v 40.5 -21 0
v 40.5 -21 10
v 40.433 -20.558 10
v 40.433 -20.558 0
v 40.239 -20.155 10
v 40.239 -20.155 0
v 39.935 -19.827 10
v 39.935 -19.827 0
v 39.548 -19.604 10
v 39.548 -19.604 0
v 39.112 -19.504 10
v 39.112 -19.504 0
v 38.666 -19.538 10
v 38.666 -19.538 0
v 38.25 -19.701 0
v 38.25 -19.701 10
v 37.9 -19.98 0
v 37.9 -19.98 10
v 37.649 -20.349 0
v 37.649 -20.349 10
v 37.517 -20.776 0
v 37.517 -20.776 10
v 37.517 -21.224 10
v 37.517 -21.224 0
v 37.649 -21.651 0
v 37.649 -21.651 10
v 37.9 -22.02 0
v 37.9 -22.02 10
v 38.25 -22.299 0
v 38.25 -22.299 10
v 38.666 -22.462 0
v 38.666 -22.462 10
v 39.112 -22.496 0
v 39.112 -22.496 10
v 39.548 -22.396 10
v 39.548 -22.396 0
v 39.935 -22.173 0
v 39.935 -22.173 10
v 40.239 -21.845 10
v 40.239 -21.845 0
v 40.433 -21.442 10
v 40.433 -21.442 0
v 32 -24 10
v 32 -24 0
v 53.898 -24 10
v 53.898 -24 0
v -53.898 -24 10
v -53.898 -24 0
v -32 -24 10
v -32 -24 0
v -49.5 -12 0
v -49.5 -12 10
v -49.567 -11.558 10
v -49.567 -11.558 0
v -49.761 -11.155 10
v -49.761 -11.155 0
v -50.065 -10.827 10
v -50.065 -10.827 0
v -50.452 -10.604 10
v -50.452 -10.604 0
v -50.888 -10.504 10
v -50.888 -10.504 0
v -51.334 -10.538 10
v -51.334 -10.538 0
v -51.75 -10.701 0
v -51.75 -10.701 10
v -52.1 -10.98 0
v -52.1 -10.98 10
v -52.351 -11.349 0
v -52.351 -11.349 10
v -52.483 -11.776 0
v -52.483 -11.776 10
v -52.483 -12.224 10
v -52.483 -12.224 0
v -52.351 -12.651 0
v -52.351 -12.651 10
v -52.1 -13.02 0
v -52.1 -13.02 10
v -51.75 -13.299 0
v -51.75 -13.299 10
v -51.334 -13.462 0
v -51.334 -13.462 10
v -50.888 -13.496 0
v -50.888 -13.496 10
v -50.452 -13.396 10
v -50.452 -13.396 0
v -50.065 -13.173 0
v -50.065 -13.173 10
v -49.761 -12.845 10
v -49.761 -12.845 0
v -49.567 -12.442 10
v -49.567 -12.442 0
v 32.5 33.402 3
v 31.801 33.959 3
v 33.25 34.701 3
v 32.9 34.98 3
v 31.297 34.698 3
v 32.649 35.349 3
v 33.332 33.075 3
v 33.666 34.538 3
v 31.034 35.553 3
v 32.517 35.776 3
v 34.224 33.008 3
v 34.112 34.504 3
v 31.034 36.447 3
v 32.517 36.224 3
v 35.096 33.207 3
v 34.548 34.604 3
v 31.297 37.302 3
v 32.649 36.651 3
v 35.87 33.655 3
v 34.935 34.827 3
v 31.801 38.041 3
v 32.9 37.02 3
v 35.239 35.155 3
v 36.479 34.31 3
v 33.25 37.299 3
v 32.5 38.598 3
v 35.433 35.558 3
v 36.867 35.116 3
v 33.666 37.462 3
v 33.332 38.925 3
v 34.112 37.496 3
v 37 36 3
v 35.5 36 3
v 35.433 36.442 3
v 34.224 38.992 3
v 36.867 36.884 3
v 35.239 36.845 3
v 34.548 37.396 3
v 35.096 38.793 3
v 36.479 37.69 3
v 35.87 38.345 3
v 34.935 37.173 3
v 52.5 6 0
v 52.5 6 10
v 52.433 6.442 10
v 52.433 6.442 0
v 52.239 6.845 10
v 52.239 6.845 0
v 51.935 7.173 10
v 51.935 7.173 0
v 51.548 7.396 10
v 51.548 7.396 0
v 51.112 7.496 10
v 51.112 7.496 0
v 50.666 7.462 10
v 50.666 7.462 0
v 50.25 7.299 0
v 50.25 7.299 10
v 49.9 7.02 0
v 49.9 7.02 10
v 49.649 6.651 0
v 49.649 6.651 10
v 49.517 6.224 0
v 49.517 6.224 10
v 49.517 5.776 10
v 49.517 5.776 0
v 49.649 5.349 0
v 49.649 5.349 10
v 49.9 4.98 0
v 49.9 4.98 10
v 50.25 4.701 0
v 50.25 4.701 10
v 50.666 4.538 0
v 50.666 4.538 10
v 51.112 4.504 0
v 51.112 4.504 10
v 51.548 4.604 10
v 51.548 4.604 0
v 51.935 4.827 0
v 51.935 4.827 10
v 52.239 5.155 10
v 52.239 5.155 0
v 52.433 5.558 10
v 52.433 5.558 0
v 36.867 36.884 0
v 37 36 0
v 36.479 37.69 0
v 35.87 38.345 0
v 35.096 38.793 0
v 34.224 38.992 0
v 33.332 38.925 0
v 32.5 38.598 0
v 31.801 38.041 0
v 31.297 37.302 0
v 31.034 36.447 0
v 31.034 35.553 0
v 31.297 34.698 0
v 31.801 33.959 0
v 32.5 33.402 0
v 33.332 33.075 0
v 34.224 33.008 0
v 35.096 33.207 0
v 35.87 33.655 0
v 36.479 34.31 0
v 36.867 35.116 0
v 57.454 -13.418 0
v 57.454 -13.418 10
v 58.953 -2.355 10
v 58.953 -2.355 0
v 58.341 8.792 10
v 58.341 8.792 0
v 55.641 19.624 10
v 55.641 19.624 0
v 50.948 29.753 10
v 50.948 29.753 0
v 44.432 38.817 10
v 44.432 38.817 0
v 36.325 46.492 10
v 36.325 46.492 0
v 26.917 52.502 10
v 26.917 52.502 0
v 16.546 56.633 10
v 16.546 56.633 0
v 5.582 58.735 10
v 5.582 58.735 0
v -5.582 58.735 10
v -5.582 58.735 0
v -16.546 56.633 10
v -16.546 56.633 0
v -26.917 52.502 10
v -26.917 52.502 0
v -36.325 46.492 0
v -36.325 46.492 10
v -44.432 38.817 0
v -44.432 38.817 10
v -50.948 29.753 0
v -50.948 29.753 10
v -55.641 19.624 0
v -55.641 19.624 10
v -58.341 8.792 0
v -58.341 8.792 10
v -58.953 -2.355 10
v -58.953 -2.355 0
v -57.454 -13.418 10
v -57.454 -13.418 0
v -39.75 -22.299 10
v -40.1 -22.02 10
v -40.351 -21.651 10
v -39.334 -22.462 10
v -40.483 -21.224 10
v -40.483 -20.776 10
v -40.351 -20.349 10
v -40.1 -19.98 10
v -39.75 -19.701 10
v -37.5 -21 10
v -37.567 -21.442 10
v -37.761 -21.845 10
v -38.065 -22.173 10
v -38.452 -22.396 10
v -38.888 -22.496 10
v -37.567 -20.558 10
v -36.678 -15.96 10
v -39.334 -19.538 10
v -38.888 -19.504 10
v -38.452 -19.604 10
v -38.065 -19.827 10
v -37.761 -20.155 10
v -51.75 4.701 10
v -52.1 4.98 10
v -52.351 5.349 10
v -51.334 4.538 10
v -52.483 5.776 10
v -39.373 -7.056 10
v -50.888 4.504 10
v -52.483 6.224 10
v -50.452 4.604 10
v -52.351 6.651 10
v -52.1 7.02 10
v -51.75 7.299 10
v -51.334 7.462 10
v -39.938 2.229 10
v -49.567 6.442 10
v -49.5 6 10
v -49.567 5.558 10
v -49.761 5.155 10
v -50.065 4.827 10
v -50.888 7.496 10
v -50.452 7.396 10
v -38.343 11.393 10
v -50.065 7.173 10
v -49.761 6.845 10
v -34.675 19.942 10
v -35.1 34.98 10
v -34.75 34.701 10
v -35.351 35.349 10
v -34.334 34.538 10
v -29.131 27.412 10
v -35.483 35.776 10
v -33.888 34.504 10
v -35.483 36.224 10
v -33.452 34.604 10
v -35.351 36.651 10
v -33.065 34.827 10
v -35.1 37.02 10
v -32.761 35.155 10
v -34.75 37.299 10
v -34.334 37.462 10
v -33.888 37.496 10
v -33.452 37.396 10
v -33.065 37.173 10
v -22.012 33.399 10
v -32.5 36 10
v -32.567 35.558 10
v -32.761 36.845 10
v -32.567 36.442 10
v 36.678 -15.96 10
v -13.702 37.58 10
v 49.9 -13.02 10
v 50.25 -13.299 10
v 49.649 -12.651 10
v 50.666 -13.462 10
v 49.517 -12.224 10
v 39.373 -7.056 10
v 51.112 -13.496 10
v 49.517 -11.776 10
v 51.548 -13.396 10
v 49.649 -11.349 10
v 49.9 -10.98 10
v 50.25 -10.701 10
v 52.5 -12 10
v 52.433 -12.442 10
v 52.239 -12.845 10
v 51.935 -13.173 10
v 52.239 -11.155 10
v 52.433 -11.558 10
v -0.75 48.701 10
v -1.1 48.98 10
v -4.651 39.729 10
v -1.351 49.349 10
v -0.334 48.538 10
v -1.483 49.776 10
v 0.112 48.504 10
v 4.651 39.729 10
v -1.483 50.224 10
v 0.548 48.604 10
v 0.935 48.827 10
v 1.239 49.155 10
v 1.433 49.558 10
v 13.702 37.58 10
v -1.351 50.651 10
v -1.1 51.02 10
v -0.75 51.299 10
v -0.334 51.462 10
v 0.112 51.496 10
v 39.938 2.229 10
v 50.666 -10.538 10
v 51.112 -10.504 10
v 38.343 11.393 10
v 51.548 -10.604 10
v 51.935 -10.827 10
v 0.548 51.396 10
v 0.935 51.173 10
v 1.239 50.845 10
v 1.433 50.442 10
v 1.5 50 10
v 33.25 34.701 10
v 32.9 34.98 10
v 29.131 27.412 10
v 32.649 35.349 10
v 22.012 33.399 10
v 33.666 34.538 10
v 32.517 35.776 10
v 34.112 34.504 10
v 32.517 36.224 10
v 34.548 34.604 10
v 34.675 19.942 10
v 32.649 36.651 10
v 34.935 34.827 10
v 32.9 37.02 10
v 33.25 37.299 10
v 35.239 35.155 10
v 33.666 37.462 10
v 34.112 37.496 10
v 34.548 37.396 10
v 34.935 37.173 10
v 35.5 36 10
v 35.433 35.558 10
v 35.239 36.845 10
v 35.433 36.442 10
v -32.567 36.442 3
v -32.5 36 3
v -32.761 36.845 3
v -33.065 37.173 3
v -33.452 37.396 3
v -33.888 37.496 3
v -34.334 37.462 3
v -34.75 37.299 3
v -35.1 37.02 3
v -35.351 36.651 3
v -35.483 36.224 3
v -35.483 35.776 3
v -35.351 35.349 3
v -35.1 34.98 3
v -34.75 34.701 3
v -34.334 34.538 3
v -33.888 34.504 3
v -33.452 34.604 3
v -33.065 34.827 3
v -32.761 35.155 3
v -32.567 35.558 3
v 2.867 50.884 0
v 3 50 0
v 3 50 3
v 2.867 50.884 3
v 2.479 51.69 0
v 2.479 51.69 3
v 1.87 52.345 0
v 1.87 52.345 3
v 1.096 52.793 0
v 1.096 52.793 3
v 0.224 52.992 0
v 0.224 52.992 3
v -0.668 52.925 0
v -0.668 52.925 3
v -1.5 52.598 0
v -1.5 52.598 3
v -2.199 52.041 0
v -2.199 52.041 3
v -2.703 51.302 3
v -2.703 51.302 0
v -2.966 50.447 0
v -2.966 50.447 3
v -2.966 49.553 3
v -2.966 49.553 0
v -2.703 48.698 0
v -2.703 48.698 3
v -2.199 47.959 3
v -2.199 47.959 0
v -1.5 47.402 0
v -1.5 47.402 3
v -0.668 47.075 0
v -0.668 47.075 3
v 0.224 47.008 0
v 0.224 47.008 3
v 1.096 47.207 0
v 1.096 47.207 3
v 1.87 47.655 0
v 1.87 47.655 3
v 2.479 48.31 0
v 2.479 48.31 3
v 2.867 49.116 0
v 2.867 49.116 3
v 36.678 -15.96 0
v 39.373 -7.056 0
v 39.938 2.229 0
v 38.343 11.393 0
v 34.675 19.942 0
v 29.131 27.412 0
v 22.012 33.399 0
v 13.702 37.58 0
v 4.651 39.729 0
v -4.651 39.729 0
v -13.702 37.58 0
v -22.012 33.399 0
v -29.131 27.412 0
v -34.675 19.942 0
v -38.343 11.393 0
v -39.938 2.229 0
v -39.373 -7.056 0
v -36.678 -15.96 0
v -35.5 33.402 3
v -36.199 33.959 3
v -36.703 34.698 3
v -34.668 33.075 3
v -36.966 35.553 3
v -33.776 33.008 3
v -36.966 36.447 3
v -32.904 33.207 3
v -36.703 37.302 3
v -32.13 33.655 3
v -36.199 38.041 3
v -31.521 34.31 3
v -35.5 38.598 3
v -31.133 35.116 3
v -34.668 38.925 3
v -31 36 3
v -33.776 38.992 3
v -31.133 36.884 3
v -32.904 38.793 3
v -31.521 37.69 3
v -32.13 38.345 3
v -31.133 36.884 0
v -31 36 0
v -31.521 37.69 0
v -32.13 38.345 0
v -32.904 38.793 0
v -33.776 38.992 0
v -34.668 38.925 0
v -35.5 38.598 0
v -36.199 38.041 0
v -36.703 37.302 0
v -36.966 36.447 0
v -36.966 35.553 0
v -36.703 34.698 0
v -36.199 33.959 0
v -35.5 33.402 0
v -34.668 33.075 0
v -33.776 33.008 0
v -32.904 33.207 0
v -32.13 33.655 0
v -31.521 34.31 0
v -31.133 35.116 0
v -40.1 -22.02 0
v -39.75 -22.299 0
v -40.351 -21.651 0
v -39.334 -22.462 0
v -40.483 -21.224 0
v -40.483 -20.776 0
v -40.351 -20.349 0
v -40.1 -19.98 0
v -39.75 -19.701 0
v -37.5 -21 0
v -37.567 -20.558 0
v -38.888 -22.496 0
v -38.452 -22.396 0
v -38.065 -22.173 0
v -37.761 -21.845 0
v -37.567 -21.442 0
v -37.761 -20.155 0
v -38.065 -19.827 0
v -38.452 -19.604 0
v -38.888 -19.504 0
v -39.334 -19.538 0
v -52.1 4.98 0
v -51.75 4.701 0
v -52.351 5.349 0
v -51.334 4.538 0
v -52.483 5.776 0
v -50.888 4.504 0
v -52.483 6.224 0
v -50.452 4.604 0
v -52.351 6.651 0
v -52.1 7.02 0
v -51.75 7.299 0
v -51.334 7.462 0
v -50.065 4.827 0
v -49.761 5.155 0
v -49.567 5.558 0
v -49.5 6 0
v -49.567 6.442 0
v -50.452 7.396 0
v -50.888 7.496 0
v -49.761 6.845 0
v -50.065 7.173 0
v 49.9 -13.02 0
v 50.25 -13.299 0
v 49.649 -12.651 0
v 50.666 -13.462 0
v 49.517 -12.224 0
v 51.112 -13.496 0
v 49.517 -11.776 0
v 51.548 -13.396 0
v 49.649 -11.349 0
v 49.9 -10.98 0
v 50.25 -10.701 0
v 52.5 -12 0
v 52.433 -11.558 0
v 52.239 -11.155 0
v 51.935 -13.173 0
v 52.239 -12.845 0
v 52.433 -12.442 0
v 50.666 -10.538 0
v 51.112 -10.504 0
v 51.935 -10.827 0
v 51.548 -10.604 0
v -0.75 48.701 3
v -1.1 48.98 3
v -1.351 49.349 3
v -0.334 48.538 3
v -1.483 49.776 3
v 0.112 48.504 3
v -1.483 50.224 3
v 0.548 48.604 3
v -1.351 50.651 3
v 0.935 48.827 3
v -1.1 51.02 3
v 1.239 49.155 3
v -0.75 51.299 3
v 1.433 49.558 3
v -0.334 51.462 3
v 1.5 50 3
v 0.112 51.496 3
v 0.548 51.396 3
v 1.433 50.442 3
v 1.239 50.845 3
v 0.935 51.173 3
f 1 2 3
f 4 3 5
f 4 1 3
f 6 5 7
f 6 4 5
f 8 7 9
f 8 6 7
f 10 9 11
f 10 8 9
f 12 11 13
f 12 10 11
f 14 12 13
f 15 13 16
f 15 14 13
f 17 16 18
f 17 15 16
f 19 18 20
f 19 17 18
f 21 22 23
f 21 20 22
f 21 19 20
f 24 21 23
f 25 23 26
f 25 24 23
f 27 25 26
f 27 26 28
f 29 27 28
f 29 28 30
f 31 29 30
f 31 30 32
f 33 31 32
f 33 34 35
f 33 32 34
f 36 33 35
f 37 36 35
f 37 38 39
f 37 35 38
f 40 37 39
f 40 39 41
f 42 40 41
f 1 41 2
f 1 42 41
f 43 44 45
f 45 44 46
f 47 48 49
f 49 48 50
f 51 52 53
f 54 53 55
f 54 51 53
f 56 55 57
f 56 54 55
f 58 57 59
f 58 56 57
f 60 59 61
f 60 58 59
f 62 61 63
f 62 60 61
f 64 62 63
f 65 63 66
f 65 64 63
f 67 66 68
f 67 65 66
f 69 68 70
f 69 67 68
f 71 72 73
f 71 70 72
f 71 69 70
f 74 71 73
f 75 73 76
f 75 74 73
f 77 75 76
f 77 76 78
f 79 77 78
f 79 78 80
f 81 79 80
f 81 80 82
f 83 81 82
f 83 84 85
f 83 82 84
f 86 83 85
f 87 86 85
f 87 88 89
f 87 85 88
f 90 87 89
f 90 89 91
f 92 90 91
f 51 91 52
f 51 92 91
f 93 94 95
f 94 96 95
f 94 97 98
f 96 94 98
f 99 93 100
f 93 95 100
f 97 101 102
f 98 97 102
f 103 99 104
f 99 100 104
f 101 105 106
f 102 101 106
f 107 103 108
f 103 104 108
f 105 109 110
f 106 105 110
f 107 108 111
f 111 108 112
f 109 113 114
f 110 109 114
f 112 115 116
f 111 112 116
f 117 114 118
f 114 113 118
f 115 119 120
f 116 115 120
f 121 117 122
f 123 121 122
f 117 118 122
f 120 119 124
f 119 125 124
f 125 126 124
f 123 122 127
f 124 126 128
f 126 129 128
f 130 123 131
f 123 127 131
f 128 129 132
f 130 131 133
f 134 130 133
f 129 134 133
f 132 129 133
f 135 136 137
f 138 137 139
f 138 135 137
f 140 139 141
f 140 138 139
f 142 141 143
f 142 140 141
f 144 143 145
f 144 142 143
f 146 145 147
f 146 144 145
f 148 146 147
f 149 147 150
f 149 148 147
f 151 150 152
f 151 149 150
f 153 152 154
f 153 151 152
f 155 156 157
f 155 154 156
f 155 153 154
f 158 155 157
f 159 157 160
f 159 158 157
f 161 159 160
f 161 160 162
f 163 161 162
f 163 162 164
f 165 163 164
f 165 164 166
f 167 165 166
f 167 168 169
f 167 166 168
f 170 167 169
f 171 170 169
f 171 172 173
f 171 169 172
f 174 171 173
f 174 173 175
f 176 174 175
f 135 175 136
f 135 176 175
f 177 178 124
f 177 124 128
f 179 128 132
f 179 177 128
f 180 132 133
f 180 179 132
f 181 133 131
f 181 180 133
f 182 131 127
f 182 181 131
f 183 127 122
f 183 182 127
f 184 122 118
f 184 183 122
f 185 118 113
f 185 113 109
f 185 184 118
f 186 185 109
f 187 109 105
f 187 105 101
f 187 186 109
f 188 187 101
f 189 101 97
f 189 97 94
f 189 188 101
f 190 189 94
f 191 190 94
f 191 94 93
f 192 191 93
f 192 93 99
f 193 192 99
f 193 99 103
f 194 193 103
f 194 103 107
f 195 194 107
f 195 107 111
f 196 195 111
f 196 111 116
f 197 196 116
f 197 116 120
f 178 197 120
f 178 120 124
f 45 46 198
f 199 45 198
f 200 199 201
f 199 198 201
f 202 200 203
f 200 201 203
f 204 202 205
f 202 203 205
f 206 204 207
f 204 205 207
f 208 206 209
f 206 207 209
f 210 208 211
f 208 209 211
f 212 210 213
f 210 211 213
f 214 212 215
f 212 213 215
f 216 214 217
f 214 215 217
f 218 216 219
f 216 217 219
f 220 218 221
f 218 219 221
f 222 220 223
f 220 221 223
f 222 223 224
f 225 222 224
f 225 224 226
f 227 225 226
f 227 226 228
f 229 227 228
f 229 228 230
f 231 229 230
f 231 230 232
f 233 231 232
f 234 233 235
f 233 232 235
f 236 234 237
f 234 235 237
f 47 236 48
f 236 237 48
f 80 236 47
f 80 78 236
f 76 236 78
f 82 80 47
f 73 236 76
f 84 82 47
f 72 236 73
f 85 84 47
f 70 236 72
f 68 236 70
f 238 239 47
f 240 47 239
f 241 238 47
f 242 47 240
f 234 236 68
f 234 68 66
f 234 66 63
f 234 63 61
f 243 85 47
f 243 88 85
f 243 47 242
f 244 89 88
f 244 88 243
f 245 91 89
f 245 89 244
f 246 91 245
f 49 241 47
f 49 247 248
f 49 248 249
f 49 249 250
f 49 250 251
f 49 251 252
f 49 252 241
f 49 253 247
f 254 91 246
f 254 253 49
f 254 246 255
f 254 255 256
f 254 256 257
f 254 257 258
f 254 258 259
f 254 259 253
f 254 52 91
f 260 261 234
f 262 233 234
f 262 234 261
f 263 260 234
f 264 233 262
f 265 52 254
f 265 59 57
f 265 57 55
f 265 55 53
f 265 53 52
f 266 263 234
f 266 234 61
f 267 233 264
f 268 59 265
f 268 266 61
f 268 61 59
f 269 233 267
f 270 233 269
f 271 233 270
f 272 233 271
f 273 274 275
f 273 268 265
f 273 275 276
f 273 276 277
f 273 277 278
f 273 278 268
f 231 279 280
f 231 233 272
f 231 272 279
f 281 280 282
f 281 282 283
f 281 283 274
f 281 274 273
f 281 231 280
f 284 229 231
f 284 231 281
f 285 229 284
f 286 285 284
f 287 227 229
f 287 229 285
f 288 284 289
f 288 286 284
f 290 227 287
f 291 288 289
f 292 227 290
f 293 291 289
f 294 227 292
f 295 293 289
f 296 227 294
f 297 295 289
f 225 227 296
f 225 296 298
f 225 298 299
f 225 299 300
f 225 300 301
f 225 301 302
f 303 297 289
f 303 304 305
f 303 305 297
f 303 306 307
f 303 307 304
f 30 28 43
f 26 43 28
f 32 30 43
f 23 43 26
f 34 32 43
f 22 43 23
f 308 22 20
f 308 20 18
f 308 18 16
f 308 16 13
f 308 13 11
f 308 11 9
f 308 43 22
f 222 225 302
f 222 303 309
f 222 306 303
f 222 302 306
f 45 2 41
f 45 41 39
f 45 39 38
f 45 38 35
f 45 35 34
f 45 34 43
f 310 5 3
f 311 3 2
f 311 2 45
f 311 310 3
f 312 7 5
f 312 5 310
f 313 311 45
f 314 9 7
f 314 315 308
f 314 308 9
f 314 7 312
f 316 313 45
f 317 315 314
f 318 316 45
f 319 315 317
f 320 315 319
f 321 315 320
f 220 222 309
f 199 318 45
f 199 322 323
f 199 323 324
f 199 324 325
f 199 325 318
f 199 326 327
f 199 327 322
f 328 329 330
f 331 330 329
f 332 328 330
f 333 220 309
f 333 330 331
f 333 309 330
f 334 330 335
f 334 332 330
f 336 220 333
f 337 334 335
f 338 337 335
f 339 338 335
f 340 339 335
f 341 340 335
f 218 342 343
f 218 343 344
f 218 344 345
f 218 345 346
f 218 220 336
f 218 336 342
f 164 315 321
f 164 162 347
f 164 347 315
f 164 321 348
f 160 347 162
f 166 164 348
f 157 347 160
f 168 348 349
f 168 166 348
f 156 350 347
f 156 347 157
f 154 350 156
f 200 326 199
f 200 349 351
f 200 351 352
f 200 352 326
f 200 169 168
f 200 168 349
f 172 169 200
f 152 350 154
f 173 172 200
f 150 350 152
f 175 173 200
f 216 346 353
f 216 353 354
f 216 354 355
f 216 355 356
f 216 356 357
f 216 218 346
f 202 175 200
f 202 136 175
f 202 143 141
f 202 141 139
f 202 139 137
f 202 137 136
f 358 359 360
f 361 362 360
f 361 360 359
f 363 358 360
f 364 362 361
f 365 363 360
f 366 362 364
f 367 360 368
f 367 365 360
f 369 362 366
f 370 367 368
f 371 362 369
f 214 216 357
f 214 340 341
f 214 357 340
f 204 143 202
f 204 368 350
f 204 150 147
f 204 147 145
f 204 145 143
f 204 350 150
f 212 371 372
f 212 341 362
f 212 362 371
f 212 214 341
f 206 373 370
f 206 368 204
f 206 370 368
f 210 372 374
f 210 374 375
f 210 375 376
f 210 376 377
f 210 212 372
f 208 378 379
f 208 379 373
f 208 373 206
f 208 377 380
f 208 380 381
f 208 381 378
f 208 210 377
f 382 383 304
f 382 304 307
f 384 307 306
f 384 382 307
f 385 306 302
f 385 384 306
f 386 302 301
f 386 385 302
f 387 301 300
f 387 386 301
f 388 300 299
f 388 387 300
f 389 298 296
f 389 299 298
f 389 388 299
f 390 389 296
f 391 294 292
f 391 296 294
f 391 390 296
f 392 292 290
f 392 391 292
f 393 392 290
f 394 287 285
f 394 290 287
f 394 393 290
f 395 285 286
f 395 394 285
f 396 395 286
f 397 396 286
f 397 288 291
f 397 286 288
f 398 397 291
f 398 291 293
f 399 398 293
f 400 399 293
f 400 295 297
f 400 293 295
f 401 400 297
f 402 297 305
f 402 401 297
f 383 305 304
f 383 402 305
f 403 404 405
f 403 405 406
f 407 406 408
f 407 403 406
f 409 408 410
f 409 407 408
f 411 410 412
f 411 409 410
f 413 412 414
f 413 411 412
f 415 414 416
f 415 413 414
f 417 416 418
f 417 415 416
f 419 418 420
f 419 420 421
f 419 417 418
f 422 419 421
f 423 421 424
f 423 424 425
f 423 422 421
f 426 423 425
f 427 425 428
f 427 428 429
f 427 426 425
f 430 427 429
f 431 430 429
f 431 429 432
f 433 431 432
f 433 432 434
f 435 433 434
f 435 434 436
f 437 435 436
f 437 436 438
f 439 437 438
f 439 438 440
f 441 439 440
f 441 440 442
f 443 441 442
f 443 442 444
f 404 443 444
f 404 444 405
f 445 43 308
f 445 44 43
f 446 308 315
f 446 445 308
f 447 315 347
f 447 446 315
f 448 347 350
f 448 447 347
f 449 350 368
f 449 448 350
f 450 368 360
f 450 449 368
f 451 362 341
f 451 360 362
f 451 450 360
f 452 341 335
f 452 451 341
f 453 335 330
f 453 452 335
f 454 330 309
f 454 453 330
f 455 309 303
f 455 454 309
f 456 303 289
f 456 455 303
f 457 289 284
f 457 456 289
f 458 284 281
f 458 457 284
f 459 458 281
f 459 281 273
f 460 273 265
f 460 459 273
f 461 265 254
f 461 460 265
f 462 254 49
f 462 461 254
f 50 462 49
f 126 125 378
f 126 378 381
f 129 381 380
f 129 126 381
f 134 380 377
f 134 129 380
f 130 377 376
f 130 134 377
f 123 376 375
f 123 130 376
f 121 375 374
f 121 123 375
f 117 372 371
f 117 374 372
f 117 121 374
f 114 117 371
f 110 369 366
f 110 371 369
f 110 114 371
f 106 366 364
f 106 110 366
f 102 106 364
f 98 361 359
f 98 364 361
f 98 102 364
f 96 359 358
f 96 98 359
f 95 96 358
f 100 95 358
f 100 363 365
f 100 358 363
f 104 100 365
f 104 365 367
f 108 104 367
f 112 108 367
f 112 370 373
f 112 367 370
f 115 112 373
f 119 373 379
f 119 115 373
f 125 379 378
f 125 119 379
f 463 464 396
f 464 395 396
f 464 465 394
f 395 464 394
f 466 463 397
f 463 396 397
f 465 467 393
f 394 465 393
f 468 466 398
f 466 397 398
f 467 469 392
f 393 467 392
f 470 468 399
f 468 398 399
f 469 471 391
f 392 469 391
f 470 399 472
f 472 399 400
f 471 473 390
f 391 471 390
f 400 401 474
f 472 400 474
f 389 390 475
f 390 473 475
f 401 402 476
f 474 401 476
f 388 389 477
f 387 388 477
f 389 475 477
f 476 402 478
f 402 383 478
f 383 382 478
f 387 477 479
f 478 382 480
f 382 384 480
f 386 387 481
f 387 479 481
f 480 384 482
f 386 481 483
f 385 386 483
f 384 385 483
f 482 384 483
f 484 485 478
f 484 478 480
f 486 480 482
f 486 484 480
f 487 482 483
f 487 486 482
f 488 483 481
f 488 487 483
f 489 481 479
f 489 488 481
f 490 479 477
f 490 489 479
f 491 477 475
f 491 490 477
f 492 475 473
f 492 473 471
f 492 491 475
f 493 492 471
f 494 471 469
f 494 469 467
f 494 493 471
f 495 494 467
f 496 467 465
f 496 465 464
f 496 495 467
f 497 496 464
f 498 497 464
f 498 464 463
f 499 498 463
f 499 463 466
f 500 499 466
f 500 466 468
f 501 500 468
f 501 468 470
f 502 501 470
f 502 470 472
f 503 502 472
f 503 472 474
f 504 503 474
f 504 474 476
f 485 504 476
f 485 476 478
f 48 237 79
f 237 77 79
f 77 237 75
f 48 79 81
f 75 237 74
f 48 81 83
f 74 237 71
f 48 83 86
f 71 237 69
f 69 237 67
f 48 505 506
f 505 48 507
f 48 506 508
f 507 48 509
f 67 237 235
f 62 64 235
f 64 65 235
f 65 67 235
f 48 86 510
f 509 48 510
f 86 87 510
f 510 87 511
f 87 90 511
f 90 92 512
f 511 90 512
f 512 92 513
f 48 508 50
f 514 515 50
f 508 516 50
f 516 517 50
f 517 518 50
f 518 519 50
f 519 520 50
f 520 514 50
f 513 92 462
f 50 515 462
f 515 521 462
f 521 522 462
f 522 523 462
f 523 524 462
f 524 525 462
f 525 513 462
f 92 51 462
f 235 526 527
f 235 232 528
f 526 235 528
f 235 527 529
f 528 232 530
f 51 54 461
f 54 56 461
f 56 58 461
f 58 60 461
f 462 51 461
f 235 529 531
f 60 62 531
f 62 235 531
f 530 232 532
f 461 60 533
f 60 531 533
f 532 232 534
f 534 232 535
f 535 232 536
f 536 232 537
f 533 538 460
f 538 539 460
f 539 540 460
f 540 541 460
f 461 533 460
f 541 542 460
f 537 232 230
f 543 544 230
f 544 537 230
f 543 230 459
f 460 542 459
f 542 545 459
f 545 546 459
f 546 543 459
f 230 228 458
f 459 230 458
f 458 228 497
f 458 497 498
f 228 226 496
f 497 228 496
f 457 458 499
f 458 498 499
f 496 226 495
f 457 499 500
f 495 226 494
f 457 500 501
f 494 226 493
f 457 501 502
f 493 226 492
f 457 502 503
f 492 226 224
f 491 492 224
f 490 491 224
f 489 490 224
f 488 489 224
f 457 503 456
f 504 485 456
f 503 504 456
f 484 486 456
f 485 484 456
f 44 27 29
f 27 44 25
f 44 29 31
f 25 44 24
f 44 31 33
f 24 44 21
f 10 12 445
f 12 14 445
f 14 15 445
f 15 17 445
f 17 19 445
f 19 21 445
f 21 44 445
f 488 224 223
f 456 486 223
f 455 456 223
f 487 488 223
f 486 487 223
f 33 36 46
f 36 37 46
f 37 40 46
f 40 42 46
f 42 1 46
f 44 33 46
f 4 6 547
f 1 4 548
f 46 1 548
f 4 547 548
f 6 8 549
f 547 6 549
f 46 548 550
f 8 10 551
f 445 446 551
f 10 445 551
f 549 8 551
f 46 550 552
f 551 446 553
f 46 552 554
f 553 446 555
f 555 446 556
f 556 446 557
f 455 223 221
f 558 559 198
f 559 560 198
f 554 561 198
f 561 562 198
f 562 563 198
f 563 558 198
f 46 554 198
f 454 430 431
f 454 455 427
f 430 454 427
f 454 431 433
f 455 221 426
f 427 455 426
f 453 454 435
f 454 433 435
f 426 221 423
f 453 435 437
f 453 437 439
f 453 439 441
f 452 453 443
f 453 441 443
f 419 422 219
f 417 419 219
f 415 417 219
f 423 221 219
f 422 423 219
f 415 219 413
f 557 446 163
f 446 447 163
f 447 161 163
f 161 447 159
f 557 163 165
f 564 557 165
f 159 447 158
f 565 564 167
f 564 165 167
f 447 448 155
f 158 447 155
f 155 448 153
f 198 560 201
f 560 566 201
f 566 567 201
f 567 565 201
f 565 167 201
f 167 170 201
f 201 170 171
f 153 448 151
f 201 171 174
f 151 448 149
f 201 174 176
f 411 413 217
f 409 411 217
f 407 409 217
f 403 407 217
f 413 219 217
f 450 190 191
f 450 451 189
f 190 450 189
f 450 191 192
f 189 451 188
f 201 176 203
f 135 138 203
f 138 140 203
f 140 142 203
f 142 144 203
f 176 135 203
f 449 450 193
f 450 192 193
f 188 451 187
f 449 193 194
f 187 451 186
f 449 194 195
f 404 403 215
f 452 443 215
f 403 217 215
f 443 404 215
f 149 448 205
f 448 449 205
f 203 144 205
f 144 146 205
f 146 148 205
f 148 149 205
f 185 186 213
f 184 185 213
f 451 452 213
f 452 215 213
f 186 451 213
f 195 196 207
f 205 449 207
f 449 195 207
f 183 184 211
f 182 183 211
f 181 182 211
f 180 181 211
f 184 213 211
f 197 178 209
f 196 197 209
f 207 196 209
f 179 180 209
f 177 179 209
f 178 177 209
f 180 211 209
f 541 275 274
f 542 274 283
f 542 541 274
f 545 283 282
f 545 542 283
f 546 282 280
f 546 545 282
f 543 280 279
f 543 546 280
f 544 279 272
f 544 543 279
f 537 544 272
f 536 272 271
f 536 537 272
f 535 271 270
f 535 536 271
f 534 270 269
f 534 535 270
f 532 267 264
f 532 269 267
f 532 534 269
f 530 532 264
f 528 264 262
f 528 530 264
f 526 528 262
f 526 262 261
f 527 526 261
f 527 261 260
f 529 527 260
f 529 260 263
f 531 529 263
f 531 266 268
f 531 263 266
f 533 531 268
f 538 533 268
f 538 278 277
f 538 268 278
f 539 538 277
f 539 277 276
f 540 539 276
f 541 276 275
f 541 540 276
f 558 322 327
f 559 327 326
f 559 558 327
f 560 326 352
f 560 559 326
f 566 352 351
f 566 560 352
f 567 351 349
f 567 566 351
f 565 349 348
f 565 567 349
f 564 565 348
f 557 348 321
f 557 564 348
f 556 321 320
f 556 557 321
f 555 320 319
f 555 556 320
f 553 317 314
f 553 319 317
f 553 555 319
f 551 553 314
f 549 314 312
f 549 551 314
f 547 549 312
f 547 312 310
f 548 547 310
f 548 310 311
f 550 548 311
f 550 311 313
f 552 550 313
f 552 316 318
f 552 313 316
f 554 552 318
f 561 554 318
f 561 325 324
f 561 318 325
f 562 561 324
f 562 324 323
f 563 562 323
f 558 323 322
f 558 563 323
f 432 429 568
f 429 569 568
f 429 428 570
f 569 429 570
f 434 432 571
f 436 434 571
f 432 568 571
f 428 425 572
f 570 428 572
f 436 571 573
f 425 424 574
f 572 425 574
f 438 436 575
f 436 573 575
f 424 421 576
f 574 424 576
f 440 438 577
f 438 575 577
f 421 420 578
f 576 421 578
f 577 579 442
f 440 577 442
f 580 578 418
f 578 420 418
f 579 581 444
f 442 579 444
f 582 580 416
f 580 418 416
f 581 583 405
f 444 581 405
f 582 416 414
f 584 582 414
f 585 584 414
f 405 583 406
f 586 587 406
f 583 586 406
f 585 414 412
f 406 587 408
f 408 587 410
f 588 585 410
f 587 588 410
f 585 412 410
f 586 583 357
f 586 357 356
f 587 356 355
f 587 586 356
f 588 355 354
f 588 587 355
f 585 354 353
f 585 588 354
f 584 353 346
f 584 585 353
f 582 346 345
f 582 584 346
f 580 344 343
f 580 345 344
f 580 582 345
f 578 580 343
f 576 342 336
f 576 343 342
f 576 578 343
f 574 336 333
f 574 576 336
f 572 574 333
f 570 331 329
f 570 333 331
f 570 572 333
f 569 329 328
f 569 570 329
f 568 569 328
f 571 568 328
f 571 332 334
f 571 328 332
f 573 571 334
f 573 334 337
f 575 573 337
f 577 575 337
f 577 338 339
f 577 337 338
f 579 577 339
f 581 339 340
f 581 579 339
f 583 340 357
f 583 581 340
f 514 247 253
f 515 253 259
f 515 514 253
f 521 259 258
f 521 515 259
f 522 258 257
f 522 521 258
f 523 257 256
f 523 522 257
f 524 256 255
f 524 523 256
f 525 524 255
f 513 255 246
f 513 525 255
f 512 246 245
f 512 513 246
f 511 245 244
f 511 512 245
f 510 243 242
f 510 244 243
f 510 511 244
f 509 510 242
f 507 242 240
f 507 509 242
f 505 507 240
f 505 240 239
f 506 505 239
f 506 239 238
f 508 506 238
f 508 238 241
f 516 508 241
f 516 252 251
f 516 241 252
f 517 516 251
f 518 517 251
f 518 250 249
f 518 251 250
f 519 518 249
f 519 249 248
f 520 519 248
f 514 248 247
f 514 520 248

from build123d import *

# Parameters (mm, degrees)
CYLINDER531_R     = 1.5
CYLINDER531_DEPTH = 100
CYLINDER530_R     = 1.5
CYLINDER530_DEPTH = 100
CYLINDER364_R     = 1.5
CYLINDER364_DEPTH = 50
CYLINDER363_R     = 3
CYLINDER363_DEPTH = 4
BOX135_W          = 200
BOX135_H          = 100
BOX135_DEPTH      = 32
CYLINDER328_R     = 1.5
CYLINDER328_DEPTH = 50
CYLINDER330_R     = 1.5
CYLINDER330_DEPTH = 50
CYLINDER331_R     = 1.5
CYLINDER331_DEPTH = 50
CYLINDER329_R     = 1.5
CYLINDER329_DEPTH = 50
CYLINDER334_R     = 3
CYLINDER334_DEPTH = 4
CYLINDER327_R     = 3
CYLINDER327_DEPTH = 4
CYLINDER292_R     = 1.5
CYLINDER292_DEPTH = 100
CYLINDER291_R     = 1.5
CYLINDER291_DEPTH = 100
CYLINDER316_R     = 3
CYLINDER316_DEPTH = 4
CYLINDER315_R     = 3
CYLINDER315_DEPTH = 4
CYLINDER313_R     = 1.5
CYLINDER313_DEPTH = 50
CYLINDER314_R     = 1.5
CYLINDER314_DEPTH = 50
CYLINDER311_R     = 3
CYLINDER311_DEPTH = 4
CYLINDER312_R     = 3
CYLINDER312_DEPTH = 4
TUBE_R            = 59
TUBE_R_2          = 40
TUBE_DEPTH        = 10


with BuildPart() as v_lec531:
    # Cylinder531 → Cylinder531 (new body)
    with BuildSketch(Plane(origin=(39, -21, 0), x_dir=(1, 0, 0), z_dir=(0, 0, 1))):
        Circle(CYLINDER531_R)
    extrude(amount=CYLINDER531_DEPTH)


with BuildPart() as compound308:
    # Cylinder530 → Cylinder530 (new body)
    with BuildSketch(Plane(origin=(-39, -21, 0), x_dir=(1, 0, 0), z_dir=(0, 0, 1))):
        Circle(CYLINDER530_R)
    extrude(amount=CYLINDER530_DEPTH)

    # Compound308: union Válec531
    add(v_lec531.part)


with BuildPart() as v_lec364:
    # Cylinder364 → Cylinder364 (new body)
    with BuildSketch(Plane(origin=(0, 50, 0), x_dir=(1, 0, 0), z_dir=(0, 0, 1))):
        Circle(CYLINDER364_R)
    extrude(amount=CYLINDER364_DEPTH)


with BuildPart() as v_lec363:
    # Cylinder363 → Cylinder363 (new body)
    with BuildSketch(Plane(origin=(0, 50, -1), x_dir=(1, 0, 0), z_dir=(0, 0, 1))):
        Circle(CYLINDER363_R)
    extrude(amount=CYLINDER363_DEPTH)


with BuildPart() as krychle135:
    # Box135 → Box135 (new body)
    with BuildSketch(Plane(origin=(-100, -124, 0), x_dir=(1, 0, 0), z_dir=(0, 0, 1))):
        with Locations((100, 50)):
            Rectangle(BOX135_W, BOX135_H)
    extrude(amount=BOX135_DEPTH)


with BuildPart() as v_lec328:
    # Cylinder328 → Cylinder328 (new body)
    with BuildSketch(Plane(origin=(-51, 6, 0), x_dir=(1, 0, 0), z_dir=(0, 0, 1))):
        Circle(CYLINDER328_R)
    extrude(amount=CYLINDER328_DEPTH)


with BuildPart() as v_lec330:
    # Cylinder330 → Cylinder330 (new body)
    with BuildSketch(Plane(origin=(-24, 18, 0), x_dir=(1, 0, 0), z_dir=(0, 0, 1))):
        Circle(CYLINDER330_R)
    extrude(amount=CYLINDER330_DEPTH)


with BuildPart() as v_lec331:
    # Cylinder331 → Cylinder331 (new body)
    with BuildSketch(Plane(origin=(24, 18, 0), x_dir=(1, 0, 0), z_dir=(0, 0, 1))):
        Circle(CYLINDER331_R)
    extrude(amount=CYLINDER331_DEPTH)


with BuildPart() as compound297:
    # Cylinder329 → Cylinder329 (new body)
    with BuildSketch(Plane(origin=(51, 6, 0), x_dir=(1, 0, 0), z_dir=(0, 0, 1))):
        Circle(CYLINDER329_R)
    extrude(amount=CYLINDER329_DEPTH)

    # Compound297: union Válec328, Válec330, Válec331
    add(v_lec328.part)
    add(v_lec330.part)
    add(v_lec331.part)


with BuildPart() as v_lec334:
    # Cylinder334 → Cylinder334 (new body)
    with BuildSketch(Plane(origin=(24, 18, 0), x_dir=(1, 0, 0), z_dir=(0, 0, 1))):
        Circle(CYLINDER334_R)
    extrude(amount=CYLINDER334_DEPTH)


with BuildPart() as compound298:
    # Cylinder327 → Cylinder327 (new body)
    with BuildSketch(Plane(origin=(-24, 18, 0), x_dir=(1, 0, 0), z_dir=(0, 0, 1))):
        Circle(CYLINDER327_R)
    extrude(amount=CYLINDER327_DEPTH)

    # Compound298: union Válec334
    add(v_lec334.part)


with BuildPart() as compound298_1:
    # Compound298 placement: moved
    add(compound298.part.moved(Location((0, 0, 7))))


with BuildPart() as v_lec292:
    # Cylinder292 → Cylinder292 (new body)
    with BuildSketch(Plane(origin=(51, -12, 0), x_dir=(1, 0, 0), z_dir=(0, 0, 1))):
        Circle(CYLINDER292_R)
    extrude(amount=CYLINDER292_DEPTH)


with BuildPart() as compound292:
    # Cylinder291 → Cylinder291 (new body)
    with BuildSketch(Plane(origin=(-51, -12, 0), x_dir=(1, 0, 0), z_dir=(0, 0, 1))):
        Circle(CYLINDER291_R)
    extrude(amount=CYLINDER291_DEPTH)

    # Compound292: union Válec292
    add(v_lec292.part)


with BuildPart() as v_lec316:
    # Cylinder316 → Cylinder316 (new body)
    with BuildSketch(Plane(origin=(51, -16, 0), x_dir=(1, 0, 0), z_dir=(0, 0, 1))):
        Circle(CYLINDER316_R)
    extrude(amount=CYLINDER316_DEPTH)


with BuildPart() as compound293:
    # Cylinder315 → Cylinder315 (new body)
    with BuildSketch(Plane(origin=(-51, -16, 0), x_dir=(1, 0, 0), z_dir=(0, 0, 1))):
        Circle(CYLINDER315_R)
    extrude(amount=CYLINDER315_DEPTH)

    # Compound293: union Válec316
    add(v_lec316.part)


with BuildPart() as compound293_1:
    # Compound293 placement: moved
    add(compound293.part.moved(Location((0, 0, 25))))


with BuildPart() as v_lec313:
    # Cylinder313 → Cylinder313 (new body)
    with BuildSketch(Plane(origin=(34, 36, 0), x_dir=(1, 0, 0), z_dir=(0, 0, 1))):
        Circle(CYLINDER313_R)
    extrude(amount=CYLINDER313_DEPTH)


with BuildPart() as compound291:
    # Cylinder314 → Cylinder314 (new body)
    with BuildSketch(Plane(origin=(-34, 36, 0), x_dir=(1, 0, 0), z_dir=(0, 0, 1))):
        Circle(CYLINDER314_R)
    extrude(amount=CYLINDER314_DEPTH)

    # Compound291: union Válec313
    add(v_lec313.part)


with BuildPart() as v_lec311:
    # Cylinder311 → Cylinder311 (new body)
    with BuildSketch(Plane(origin=(-34, 36, -1), x_dir=(1, 0, 0), z_dir=(0, 0, 1))):
        Circle(CYLINDER311_R)
    extrude(amount=CYLINDER311_DEPTH)


with BuildPart() as compound290:
    # Cylinder312 → Cylinder312 (new body)
    with BuildSketch(Plane(origin=(34, 36, -1), x_dir=(1, 0, 0), z_dir=(0, 0, 1))):
        Circle(CYLINDER312_R)
    extrude(amount=CYLINDER312_DEPTH)

    # Compound290: union Válec311
    add(v_lec311.part)


with BuildPart() as cut169:
    # Tube → Tube (new body)
    with BuildSketch(Plane.XY):
        Circle(TUBE_R)
        Circle(TUBE_R_2, mode=Mode.SUBTRACT)
    extrude(amount=TUBE_DEPTH)

    # Cut136: cut Compound290
    add(compound290.part, mode=Mode.SUBTRACT)

    # Cut137: cut Compound291
    add(compound291.part, mode=Mode.SUBTRACT)

    # Cut138: cut Compound293
    add(compound293_1.part, mode=Mode.SUBTRACT)

    # Cut139: cut Compound292
    add(compound292.part, mode=Mode.SUBTRACT)

    # Cut142: cut Compound298
    add(compound298_1.part, mode=Mode.SUBTRACT)

    # Cut143: cut Compound297
    add(compound297.part, mode=Mode.SUBTRACT)

    # Cut144: cut Krychle135
    add(krychle135.part, mode=Mode.SUBTRACT)

    # Cut153: cut Válec363
    add(v_lec363.part, mode=Mode.SUBTRACT)

    # Cut154: cut Válec364
    add(v_lec364.part, mode=Mode.SUBTRACT)

    # Cut169: cut Compound308
    add(compound308.part, mode=Mode.SUBTRACT)


solid = cut169.part
